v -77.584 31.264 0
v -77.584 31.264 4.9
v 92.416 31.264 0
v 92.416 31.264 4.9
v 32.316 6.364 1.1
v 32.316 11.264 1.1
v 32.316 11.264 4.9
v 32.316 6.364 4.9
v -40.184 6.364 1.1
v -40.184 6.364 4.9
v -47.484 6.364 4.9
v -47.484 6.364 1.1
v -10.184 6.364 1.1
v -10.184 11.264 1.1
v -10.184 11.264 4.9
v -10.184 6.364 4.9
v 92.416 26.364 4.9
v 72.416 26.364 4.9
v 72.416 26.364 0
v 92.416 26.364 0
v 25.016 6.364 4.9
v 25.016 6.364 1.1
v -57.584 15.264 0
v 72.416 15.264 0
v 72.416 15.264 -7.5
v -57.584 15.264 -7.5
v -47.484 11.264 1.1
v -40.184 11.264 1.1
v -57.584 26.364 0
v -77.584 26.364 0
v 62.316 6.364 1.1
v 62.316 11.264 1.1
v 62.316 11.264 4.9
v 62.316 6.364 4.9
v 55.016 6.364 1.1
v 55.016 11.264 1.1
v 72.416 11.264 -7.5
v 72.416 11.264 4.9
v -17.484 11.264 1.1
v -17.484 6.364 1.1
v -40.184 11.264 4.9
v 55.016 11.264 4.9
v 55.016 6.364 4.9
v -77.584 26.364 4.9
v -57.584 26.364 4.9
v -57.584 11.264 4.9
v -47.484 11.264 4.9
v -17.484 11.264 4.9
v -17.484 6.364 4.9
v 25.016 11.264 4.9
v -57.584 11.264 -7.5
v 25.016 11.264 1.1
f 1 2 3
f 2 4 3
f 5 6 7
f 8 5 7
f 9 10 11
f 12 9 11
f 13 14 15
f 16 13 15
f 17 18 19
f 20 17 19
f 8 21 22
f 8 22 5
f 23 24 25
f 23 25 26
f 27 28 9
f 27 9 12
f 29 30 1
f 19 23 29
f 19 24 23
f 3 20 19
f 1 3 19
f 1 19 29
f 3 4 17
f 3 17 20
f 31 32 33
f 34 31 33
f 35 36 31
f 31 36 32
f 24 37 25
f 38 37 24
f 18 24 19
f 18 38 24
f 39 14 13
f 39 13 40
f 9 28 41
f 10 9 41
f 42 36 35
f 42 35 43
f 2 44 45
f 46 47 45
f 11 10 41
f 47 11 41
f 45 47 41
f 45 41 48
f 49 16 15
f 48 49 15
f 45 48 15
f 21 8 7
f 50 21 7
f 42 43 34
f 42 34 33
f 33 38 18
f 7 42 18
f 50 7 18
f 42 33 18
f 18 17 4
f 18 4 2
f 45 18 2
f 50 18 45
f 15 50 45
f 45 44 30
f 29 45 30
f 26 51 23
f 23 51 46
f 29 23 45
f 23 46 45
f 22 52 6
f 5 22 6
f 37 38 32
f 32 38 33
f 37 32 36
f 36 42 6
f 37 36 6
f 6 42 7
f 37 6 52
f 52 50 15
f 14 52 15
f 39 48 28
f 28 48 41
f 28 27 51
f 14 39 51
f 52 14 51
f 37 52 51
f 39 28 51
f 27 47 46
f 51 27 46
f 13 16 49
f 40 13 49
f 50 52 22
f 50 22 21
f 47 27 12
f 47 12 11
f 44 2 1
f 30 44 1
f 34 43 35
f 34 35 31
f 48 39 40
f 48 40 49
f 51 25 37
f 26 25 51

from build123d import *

# Parameters (mm, degrees)
SKETCH1_W           = 130
SKETCH1_H           = 20
BOSS_EXTRUDE1_DEPTH = 4.9
SKETCH3_W           = 4.9
SKETCH3_H           = 4.9
BOSS_EXTRUDE2_DEPTH = 20
SKETCH4_W           = 130
SKETCH4_H           = 4
BOSS_EXTRUDE3_DEPTH = 7.5
SKETCH5_W           = 7.3
SKETCH5_H           = 3.8
BOSS_EXTRUDE4_DEPTH = 4.9
SKETCH6_W           = 7.3
SKETCH6_H           = 3.8
BOSS_EXTRUDE5_DEPTH = 4.9


with BuildPart() as part:
    # Sketch1 → Boss-Extrude1 (new body)
    with BuildSketch(Plane.XY):
        with Locations((7.416107383, 21.263982103)):
            Rectangle(SKETCH1_W, SKETCH1_H)
    extrude(amount=BOSS_EXTRUDE1_DEPTH)

    # Sketch3 → Boss-Extrude2 (add)
    with BuildSketch(Plane(origin=(72.416107383, 0, 0), x_dir=(0, 0, -1), z_dir=(1, 0, 0))):
        with Locations((-2.45, 28.813982103)):
            Rectangle(SKETCH3_W, SKETCH3_H)
    boss_extrude2 = extrude(amount=BOSS_EXTRUDE2_DEPTH)

    # Mirror1: Boss-Extrude2 across plane
    add(boss_extrude2.mirror(Plane.ZY.offset(-7.416107383)))

    # Sketch4 → Boss-Extrude3 (add)
    with BuildSketch(Plane(origin=(0, 0, 0), x_dir=(-1, 0, 0), z_dir=(0, 0, -1))):
        with Locations((-7.416107383, 13.263982103)):
            Rectangle(SKETCH4_W, SKETCH4_H)
    extrude(amount=BOSS_EXTRUDE3_DEPTH)

    # Sketch5 → Boss-Extrude4 (add)
    with BuildSketch(Plane.XZ.offset(-11.263982103)):
        with Locations((28.666107383, 3)):
            Rectangle(SKETCH5_W, SKETCH5_H)
    boss_extrude4 = extrude(amount=BOSS_EXTRUDE4_DEPTH)

    # Mirror2: Boss-Extrude4 across plane
    add(boss_extrude4.mirror(Plane.ZY.offset(-7.416107383)))

    # Sketch6 → Boss-Extrude5 (add)
    with BuildSketch(Plane.XZ.offset(-11.263982103)):
        with Locations((58.666107383, 3)):
            Rectangle(SKETCH6_W, SKETCH6_H)
    boss_extrude5 = extrude(amount=BOSS_EXTRUDE5_DEPTH)

    # Mirror3: Boss-Extrude5 across plane
    add(boss_extrude5.mirror(Plane.ZY.offset(-7.416107383)))


solid = part.part
